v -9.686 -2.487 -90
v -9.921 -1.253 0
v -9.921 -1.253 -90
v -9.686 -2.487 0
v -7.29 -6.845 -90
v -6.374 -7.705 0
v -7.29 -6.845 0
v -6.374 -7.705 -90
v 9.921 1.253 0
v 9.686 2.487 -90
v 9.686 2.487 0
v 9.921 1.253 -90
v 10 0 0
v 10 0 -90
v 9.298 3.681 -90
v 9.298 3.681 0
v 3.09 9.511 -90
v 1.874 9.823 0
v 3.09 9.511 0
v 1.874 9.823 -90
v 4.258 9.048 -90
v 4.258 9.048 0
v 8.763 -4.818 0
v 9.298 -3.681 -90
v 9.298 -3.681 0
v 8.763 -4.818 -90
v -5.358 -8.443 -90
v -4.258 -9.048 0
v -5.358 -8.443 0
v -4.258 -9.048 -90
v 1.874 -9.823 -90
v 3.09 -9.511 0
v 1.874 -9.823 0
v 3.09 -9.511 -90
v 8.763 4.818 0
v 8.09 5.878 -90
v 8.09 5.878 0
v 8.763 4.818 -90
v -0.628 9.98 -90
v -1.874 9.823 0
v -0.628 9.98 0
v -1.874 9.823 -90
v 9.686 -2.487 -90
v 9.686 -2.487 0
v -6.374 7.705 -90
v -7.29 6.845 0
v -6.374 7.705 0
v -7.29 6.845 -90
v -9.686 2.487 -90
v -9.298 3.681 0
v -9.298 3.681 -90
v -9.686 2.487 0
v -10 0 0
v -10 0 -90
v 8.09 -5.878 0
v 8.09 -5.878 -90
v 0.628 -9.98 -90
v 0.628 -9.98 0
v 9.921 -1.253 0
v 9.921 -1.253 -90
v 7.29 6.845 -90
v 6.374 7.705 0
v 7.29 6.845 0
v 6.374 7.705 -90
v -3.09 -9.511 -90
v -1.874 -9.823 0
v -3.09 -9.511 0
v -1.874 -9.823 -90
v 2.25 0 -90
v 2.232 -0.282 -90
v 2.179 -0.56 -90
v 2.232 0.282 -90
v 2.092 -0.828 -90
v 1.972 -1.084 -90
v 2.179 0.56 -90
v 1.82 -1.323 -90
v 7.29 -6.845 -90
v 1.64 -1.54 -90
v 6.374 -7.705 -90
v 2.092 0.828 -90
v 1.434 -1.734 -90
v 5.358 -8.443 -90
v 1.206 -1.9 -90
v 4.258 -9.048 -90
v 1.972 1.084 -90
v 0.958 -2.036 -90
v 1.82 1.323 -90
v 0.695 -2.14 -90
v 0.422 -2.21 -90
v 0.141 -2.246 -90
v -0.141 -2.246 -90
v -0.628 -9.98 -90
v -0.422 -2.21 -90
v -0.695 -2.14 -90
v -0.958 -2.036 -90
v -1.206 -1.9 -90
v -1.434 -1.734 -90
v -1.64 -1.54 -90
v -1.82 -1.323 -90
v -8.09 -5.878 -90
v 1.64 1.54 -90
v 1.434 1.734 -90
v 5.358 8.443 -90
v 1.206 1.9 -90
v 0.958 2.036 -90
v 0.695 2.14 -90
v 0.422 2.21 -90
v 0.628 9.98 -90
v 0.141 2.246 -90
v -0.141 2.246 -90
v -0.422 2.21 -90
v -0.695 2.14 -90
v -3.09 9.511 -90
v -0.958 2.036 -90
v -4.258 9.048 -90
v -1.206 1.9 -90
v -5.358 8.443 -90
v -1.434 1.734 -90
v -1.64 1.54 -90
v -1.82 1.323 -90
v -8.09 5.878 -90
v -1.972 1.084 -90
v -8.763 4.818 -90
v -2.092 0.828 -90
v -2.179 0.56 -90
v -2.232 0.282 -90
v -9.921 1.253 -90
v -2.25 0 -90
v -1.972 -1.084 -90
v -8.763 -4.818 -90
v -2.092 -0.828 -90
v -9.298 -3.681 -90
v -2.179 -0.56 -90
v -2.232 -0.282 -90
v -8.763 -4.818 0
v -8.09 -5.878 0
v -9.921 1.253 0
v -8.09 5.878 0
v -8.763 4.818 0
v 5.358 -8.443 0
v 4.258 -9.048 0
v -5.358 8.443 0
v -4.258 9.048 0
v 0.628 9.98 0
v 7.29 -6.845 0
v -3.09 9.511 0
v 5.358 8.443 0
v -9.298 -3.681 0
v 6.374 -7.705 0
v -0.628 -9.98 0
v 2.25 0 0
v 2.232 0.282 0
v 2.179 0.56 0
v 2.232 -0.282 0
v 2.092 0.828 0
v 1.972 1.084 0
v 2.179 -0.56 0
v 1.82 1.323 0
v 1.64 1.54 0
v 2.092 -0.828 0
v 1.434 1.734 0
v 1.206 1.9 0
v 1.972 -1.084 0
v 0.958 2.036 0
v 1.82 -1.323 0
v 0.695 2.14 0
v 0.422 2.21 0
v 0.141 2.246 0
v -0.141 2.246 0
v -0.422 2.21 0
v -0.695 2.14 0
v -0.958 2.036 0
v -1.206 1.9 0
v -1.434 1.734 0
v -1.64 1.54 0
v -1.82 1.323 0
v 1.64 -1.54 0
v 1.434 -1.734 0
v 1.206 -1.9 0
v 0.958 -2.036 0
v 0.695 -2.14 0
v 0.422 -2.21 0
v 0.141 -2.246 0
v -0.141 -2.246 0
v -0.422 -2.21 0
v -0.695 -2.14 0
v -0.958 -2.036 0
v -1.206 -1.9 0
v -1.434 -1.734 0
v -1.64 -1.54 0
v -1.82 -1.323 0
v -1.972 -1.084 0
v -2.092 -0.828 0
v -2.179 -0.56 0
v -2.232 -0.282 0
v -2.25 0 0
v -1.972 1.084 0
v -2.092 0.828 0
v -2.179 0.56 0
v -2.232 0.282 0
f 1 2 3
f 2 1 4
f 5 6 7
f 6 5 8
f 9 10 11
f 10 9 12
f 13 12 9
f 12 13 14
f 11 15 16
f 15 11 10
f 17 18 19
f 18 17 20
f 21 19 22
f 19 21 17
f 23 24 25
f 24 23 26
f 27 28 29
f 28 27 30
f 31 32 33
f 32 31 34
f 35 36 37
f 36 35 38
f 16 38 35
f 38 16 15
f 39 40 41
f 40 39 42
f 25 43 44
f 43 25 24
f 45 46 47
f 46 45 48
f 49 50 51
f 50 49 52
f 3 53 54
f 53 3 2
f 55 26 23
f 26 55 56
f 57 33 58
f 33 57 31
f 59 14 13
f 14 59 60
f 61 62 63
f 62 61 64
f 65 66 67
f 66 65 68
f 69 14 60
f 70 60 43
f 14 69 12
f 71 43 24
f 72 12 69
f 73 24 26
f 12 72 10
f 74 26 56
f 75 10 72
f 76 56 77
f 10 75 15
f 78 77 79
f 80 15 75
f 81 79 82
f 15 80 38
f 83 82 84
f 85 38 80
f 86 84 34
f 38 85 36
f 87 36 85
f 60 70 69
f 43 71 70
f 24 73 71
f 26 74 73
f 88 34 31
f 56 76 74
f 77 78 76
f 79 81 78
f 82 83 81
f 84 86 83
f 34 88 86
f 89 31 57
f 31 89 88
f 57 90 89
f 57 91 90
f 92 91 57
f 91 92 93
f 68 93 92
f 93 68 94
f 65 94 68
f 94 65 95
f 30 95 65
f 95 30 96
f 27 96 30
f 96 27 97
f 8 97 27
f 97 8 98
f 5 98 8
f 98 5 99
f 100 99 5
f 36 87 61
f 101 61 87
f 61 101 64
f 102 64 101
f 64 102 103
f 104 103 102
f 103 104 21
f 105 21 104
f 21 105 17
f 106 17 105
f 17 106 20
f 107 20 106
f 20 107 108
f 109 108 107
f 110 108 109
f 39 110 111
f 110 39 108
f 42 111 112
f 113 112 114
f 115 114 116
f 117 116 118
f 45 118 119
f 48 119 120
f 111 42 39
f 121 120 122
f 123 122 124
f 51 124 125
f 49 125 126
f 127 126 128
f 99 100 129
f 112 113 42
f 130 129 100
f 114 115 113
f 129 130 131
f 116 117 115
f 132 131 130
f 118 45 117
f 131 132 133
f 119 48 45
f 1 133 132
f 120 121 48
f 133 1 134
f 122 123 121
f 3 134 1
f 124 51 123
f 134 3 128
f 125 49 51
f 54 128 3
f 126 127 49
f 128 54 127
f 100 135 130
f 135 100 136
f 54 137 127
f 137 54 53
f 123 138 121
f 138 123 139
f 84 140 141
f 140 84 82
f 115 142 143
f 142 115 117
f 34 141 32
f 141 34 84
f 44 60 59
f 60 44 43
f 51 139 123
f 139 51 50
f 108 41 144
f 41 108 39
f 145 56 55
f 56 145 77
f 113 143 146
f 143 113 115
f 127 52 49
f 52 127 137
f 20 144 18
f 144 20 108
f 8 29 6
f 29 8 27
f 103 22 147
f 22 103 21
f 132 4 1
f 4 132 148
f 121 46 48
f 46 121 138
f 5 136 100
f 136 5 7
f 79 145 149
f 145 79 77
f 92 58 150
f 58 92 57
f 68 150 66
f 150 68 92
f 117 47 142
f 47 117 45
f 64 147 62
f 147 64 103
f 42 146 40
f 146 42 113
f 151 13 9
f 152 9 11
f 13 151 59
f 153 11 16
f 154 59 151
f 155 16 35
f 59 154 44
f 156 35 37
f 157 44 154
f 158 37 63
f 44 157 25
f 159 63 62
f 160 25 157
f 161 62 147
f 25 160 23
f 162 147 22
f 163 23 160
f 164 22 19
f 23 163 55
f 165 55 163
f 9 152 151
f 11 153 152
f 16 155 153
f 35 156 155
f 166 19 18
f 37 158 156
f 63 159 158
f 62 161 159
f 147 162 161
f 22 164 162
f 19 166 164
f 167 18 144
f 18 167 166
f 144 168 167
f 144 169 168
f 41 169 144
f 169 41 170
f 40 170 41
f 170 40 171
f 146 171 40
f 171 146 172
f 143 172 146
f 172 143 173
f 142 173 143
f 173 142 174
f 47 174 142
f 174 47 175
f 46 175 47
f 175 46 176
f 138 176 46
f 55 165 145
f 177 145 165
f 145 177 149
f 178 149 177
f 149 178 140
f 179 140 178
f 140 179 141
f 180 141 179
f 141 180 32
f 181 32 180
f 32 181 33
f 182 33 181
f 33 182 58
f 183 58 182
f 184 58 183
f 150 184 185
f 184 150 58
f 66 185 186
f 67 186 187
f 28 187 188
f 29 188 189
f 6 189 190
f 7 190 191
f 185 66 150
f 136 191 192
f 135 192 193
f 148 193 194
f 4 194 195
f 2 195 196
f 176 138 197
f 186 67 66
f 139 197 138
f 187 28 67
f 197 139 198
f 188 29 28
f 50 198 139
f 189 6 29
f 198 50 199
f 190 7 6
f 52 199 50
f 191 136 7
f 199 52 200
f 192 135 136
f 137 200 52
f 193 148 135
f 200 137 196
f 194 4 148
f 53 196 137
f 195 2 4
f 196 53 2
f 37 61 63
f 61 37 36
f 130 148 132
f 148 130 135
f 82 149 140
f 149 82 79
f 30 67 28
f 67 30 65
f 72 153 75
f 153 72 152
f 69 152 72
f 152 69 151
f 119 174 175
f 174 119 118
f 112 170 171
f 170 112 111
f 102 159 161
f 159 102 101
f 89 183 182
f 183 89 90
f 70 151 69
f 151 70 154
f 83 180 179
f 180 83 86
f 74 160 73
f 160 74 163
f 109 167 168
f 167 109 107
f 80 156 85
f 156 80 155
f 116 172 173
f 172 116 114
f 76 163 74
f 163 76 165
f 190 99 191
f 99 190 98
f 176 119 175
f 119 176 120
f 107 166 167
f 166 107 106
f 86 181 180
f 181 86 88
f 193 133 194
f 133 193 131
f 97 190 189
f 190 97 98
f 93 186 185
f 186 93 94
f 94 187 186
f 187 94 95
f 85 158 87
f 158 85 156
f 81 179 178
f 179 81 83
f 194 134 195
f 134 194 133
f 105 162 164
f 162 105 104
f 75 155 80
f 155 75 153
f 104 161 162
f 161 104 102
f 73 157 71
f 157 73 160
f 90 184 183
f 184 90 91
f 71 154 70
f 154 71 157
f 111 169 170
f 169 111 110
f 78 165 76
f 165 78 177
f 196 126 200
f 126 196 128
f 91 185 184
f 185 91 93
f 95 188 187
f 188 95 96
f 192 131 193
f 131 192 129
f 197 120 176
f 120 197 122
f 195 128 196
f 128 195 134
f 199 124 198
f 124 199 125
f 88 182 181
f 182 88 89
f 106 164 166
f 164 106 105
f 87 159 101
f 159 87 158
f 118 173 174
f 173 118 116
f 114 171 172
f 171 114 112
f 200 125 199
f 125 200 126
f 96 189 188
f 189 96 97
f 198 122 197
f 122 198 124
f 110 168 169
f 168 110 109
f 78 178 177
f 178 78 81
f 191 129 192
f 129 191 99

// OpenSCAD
$fn = 50;


difference() {
	union() {
		translate(v = [0, 0, -90.0000000000]) {
			cylinder(h = 90, r = 10.0000000000);
		}
		cylinder(h = 0, r = 20.0000000000);
	}
	union() {
		#translate(v = [0, 0, -90]) {
			cylinder(h = 90, r = 2.2500000000);
		}
	}
}
